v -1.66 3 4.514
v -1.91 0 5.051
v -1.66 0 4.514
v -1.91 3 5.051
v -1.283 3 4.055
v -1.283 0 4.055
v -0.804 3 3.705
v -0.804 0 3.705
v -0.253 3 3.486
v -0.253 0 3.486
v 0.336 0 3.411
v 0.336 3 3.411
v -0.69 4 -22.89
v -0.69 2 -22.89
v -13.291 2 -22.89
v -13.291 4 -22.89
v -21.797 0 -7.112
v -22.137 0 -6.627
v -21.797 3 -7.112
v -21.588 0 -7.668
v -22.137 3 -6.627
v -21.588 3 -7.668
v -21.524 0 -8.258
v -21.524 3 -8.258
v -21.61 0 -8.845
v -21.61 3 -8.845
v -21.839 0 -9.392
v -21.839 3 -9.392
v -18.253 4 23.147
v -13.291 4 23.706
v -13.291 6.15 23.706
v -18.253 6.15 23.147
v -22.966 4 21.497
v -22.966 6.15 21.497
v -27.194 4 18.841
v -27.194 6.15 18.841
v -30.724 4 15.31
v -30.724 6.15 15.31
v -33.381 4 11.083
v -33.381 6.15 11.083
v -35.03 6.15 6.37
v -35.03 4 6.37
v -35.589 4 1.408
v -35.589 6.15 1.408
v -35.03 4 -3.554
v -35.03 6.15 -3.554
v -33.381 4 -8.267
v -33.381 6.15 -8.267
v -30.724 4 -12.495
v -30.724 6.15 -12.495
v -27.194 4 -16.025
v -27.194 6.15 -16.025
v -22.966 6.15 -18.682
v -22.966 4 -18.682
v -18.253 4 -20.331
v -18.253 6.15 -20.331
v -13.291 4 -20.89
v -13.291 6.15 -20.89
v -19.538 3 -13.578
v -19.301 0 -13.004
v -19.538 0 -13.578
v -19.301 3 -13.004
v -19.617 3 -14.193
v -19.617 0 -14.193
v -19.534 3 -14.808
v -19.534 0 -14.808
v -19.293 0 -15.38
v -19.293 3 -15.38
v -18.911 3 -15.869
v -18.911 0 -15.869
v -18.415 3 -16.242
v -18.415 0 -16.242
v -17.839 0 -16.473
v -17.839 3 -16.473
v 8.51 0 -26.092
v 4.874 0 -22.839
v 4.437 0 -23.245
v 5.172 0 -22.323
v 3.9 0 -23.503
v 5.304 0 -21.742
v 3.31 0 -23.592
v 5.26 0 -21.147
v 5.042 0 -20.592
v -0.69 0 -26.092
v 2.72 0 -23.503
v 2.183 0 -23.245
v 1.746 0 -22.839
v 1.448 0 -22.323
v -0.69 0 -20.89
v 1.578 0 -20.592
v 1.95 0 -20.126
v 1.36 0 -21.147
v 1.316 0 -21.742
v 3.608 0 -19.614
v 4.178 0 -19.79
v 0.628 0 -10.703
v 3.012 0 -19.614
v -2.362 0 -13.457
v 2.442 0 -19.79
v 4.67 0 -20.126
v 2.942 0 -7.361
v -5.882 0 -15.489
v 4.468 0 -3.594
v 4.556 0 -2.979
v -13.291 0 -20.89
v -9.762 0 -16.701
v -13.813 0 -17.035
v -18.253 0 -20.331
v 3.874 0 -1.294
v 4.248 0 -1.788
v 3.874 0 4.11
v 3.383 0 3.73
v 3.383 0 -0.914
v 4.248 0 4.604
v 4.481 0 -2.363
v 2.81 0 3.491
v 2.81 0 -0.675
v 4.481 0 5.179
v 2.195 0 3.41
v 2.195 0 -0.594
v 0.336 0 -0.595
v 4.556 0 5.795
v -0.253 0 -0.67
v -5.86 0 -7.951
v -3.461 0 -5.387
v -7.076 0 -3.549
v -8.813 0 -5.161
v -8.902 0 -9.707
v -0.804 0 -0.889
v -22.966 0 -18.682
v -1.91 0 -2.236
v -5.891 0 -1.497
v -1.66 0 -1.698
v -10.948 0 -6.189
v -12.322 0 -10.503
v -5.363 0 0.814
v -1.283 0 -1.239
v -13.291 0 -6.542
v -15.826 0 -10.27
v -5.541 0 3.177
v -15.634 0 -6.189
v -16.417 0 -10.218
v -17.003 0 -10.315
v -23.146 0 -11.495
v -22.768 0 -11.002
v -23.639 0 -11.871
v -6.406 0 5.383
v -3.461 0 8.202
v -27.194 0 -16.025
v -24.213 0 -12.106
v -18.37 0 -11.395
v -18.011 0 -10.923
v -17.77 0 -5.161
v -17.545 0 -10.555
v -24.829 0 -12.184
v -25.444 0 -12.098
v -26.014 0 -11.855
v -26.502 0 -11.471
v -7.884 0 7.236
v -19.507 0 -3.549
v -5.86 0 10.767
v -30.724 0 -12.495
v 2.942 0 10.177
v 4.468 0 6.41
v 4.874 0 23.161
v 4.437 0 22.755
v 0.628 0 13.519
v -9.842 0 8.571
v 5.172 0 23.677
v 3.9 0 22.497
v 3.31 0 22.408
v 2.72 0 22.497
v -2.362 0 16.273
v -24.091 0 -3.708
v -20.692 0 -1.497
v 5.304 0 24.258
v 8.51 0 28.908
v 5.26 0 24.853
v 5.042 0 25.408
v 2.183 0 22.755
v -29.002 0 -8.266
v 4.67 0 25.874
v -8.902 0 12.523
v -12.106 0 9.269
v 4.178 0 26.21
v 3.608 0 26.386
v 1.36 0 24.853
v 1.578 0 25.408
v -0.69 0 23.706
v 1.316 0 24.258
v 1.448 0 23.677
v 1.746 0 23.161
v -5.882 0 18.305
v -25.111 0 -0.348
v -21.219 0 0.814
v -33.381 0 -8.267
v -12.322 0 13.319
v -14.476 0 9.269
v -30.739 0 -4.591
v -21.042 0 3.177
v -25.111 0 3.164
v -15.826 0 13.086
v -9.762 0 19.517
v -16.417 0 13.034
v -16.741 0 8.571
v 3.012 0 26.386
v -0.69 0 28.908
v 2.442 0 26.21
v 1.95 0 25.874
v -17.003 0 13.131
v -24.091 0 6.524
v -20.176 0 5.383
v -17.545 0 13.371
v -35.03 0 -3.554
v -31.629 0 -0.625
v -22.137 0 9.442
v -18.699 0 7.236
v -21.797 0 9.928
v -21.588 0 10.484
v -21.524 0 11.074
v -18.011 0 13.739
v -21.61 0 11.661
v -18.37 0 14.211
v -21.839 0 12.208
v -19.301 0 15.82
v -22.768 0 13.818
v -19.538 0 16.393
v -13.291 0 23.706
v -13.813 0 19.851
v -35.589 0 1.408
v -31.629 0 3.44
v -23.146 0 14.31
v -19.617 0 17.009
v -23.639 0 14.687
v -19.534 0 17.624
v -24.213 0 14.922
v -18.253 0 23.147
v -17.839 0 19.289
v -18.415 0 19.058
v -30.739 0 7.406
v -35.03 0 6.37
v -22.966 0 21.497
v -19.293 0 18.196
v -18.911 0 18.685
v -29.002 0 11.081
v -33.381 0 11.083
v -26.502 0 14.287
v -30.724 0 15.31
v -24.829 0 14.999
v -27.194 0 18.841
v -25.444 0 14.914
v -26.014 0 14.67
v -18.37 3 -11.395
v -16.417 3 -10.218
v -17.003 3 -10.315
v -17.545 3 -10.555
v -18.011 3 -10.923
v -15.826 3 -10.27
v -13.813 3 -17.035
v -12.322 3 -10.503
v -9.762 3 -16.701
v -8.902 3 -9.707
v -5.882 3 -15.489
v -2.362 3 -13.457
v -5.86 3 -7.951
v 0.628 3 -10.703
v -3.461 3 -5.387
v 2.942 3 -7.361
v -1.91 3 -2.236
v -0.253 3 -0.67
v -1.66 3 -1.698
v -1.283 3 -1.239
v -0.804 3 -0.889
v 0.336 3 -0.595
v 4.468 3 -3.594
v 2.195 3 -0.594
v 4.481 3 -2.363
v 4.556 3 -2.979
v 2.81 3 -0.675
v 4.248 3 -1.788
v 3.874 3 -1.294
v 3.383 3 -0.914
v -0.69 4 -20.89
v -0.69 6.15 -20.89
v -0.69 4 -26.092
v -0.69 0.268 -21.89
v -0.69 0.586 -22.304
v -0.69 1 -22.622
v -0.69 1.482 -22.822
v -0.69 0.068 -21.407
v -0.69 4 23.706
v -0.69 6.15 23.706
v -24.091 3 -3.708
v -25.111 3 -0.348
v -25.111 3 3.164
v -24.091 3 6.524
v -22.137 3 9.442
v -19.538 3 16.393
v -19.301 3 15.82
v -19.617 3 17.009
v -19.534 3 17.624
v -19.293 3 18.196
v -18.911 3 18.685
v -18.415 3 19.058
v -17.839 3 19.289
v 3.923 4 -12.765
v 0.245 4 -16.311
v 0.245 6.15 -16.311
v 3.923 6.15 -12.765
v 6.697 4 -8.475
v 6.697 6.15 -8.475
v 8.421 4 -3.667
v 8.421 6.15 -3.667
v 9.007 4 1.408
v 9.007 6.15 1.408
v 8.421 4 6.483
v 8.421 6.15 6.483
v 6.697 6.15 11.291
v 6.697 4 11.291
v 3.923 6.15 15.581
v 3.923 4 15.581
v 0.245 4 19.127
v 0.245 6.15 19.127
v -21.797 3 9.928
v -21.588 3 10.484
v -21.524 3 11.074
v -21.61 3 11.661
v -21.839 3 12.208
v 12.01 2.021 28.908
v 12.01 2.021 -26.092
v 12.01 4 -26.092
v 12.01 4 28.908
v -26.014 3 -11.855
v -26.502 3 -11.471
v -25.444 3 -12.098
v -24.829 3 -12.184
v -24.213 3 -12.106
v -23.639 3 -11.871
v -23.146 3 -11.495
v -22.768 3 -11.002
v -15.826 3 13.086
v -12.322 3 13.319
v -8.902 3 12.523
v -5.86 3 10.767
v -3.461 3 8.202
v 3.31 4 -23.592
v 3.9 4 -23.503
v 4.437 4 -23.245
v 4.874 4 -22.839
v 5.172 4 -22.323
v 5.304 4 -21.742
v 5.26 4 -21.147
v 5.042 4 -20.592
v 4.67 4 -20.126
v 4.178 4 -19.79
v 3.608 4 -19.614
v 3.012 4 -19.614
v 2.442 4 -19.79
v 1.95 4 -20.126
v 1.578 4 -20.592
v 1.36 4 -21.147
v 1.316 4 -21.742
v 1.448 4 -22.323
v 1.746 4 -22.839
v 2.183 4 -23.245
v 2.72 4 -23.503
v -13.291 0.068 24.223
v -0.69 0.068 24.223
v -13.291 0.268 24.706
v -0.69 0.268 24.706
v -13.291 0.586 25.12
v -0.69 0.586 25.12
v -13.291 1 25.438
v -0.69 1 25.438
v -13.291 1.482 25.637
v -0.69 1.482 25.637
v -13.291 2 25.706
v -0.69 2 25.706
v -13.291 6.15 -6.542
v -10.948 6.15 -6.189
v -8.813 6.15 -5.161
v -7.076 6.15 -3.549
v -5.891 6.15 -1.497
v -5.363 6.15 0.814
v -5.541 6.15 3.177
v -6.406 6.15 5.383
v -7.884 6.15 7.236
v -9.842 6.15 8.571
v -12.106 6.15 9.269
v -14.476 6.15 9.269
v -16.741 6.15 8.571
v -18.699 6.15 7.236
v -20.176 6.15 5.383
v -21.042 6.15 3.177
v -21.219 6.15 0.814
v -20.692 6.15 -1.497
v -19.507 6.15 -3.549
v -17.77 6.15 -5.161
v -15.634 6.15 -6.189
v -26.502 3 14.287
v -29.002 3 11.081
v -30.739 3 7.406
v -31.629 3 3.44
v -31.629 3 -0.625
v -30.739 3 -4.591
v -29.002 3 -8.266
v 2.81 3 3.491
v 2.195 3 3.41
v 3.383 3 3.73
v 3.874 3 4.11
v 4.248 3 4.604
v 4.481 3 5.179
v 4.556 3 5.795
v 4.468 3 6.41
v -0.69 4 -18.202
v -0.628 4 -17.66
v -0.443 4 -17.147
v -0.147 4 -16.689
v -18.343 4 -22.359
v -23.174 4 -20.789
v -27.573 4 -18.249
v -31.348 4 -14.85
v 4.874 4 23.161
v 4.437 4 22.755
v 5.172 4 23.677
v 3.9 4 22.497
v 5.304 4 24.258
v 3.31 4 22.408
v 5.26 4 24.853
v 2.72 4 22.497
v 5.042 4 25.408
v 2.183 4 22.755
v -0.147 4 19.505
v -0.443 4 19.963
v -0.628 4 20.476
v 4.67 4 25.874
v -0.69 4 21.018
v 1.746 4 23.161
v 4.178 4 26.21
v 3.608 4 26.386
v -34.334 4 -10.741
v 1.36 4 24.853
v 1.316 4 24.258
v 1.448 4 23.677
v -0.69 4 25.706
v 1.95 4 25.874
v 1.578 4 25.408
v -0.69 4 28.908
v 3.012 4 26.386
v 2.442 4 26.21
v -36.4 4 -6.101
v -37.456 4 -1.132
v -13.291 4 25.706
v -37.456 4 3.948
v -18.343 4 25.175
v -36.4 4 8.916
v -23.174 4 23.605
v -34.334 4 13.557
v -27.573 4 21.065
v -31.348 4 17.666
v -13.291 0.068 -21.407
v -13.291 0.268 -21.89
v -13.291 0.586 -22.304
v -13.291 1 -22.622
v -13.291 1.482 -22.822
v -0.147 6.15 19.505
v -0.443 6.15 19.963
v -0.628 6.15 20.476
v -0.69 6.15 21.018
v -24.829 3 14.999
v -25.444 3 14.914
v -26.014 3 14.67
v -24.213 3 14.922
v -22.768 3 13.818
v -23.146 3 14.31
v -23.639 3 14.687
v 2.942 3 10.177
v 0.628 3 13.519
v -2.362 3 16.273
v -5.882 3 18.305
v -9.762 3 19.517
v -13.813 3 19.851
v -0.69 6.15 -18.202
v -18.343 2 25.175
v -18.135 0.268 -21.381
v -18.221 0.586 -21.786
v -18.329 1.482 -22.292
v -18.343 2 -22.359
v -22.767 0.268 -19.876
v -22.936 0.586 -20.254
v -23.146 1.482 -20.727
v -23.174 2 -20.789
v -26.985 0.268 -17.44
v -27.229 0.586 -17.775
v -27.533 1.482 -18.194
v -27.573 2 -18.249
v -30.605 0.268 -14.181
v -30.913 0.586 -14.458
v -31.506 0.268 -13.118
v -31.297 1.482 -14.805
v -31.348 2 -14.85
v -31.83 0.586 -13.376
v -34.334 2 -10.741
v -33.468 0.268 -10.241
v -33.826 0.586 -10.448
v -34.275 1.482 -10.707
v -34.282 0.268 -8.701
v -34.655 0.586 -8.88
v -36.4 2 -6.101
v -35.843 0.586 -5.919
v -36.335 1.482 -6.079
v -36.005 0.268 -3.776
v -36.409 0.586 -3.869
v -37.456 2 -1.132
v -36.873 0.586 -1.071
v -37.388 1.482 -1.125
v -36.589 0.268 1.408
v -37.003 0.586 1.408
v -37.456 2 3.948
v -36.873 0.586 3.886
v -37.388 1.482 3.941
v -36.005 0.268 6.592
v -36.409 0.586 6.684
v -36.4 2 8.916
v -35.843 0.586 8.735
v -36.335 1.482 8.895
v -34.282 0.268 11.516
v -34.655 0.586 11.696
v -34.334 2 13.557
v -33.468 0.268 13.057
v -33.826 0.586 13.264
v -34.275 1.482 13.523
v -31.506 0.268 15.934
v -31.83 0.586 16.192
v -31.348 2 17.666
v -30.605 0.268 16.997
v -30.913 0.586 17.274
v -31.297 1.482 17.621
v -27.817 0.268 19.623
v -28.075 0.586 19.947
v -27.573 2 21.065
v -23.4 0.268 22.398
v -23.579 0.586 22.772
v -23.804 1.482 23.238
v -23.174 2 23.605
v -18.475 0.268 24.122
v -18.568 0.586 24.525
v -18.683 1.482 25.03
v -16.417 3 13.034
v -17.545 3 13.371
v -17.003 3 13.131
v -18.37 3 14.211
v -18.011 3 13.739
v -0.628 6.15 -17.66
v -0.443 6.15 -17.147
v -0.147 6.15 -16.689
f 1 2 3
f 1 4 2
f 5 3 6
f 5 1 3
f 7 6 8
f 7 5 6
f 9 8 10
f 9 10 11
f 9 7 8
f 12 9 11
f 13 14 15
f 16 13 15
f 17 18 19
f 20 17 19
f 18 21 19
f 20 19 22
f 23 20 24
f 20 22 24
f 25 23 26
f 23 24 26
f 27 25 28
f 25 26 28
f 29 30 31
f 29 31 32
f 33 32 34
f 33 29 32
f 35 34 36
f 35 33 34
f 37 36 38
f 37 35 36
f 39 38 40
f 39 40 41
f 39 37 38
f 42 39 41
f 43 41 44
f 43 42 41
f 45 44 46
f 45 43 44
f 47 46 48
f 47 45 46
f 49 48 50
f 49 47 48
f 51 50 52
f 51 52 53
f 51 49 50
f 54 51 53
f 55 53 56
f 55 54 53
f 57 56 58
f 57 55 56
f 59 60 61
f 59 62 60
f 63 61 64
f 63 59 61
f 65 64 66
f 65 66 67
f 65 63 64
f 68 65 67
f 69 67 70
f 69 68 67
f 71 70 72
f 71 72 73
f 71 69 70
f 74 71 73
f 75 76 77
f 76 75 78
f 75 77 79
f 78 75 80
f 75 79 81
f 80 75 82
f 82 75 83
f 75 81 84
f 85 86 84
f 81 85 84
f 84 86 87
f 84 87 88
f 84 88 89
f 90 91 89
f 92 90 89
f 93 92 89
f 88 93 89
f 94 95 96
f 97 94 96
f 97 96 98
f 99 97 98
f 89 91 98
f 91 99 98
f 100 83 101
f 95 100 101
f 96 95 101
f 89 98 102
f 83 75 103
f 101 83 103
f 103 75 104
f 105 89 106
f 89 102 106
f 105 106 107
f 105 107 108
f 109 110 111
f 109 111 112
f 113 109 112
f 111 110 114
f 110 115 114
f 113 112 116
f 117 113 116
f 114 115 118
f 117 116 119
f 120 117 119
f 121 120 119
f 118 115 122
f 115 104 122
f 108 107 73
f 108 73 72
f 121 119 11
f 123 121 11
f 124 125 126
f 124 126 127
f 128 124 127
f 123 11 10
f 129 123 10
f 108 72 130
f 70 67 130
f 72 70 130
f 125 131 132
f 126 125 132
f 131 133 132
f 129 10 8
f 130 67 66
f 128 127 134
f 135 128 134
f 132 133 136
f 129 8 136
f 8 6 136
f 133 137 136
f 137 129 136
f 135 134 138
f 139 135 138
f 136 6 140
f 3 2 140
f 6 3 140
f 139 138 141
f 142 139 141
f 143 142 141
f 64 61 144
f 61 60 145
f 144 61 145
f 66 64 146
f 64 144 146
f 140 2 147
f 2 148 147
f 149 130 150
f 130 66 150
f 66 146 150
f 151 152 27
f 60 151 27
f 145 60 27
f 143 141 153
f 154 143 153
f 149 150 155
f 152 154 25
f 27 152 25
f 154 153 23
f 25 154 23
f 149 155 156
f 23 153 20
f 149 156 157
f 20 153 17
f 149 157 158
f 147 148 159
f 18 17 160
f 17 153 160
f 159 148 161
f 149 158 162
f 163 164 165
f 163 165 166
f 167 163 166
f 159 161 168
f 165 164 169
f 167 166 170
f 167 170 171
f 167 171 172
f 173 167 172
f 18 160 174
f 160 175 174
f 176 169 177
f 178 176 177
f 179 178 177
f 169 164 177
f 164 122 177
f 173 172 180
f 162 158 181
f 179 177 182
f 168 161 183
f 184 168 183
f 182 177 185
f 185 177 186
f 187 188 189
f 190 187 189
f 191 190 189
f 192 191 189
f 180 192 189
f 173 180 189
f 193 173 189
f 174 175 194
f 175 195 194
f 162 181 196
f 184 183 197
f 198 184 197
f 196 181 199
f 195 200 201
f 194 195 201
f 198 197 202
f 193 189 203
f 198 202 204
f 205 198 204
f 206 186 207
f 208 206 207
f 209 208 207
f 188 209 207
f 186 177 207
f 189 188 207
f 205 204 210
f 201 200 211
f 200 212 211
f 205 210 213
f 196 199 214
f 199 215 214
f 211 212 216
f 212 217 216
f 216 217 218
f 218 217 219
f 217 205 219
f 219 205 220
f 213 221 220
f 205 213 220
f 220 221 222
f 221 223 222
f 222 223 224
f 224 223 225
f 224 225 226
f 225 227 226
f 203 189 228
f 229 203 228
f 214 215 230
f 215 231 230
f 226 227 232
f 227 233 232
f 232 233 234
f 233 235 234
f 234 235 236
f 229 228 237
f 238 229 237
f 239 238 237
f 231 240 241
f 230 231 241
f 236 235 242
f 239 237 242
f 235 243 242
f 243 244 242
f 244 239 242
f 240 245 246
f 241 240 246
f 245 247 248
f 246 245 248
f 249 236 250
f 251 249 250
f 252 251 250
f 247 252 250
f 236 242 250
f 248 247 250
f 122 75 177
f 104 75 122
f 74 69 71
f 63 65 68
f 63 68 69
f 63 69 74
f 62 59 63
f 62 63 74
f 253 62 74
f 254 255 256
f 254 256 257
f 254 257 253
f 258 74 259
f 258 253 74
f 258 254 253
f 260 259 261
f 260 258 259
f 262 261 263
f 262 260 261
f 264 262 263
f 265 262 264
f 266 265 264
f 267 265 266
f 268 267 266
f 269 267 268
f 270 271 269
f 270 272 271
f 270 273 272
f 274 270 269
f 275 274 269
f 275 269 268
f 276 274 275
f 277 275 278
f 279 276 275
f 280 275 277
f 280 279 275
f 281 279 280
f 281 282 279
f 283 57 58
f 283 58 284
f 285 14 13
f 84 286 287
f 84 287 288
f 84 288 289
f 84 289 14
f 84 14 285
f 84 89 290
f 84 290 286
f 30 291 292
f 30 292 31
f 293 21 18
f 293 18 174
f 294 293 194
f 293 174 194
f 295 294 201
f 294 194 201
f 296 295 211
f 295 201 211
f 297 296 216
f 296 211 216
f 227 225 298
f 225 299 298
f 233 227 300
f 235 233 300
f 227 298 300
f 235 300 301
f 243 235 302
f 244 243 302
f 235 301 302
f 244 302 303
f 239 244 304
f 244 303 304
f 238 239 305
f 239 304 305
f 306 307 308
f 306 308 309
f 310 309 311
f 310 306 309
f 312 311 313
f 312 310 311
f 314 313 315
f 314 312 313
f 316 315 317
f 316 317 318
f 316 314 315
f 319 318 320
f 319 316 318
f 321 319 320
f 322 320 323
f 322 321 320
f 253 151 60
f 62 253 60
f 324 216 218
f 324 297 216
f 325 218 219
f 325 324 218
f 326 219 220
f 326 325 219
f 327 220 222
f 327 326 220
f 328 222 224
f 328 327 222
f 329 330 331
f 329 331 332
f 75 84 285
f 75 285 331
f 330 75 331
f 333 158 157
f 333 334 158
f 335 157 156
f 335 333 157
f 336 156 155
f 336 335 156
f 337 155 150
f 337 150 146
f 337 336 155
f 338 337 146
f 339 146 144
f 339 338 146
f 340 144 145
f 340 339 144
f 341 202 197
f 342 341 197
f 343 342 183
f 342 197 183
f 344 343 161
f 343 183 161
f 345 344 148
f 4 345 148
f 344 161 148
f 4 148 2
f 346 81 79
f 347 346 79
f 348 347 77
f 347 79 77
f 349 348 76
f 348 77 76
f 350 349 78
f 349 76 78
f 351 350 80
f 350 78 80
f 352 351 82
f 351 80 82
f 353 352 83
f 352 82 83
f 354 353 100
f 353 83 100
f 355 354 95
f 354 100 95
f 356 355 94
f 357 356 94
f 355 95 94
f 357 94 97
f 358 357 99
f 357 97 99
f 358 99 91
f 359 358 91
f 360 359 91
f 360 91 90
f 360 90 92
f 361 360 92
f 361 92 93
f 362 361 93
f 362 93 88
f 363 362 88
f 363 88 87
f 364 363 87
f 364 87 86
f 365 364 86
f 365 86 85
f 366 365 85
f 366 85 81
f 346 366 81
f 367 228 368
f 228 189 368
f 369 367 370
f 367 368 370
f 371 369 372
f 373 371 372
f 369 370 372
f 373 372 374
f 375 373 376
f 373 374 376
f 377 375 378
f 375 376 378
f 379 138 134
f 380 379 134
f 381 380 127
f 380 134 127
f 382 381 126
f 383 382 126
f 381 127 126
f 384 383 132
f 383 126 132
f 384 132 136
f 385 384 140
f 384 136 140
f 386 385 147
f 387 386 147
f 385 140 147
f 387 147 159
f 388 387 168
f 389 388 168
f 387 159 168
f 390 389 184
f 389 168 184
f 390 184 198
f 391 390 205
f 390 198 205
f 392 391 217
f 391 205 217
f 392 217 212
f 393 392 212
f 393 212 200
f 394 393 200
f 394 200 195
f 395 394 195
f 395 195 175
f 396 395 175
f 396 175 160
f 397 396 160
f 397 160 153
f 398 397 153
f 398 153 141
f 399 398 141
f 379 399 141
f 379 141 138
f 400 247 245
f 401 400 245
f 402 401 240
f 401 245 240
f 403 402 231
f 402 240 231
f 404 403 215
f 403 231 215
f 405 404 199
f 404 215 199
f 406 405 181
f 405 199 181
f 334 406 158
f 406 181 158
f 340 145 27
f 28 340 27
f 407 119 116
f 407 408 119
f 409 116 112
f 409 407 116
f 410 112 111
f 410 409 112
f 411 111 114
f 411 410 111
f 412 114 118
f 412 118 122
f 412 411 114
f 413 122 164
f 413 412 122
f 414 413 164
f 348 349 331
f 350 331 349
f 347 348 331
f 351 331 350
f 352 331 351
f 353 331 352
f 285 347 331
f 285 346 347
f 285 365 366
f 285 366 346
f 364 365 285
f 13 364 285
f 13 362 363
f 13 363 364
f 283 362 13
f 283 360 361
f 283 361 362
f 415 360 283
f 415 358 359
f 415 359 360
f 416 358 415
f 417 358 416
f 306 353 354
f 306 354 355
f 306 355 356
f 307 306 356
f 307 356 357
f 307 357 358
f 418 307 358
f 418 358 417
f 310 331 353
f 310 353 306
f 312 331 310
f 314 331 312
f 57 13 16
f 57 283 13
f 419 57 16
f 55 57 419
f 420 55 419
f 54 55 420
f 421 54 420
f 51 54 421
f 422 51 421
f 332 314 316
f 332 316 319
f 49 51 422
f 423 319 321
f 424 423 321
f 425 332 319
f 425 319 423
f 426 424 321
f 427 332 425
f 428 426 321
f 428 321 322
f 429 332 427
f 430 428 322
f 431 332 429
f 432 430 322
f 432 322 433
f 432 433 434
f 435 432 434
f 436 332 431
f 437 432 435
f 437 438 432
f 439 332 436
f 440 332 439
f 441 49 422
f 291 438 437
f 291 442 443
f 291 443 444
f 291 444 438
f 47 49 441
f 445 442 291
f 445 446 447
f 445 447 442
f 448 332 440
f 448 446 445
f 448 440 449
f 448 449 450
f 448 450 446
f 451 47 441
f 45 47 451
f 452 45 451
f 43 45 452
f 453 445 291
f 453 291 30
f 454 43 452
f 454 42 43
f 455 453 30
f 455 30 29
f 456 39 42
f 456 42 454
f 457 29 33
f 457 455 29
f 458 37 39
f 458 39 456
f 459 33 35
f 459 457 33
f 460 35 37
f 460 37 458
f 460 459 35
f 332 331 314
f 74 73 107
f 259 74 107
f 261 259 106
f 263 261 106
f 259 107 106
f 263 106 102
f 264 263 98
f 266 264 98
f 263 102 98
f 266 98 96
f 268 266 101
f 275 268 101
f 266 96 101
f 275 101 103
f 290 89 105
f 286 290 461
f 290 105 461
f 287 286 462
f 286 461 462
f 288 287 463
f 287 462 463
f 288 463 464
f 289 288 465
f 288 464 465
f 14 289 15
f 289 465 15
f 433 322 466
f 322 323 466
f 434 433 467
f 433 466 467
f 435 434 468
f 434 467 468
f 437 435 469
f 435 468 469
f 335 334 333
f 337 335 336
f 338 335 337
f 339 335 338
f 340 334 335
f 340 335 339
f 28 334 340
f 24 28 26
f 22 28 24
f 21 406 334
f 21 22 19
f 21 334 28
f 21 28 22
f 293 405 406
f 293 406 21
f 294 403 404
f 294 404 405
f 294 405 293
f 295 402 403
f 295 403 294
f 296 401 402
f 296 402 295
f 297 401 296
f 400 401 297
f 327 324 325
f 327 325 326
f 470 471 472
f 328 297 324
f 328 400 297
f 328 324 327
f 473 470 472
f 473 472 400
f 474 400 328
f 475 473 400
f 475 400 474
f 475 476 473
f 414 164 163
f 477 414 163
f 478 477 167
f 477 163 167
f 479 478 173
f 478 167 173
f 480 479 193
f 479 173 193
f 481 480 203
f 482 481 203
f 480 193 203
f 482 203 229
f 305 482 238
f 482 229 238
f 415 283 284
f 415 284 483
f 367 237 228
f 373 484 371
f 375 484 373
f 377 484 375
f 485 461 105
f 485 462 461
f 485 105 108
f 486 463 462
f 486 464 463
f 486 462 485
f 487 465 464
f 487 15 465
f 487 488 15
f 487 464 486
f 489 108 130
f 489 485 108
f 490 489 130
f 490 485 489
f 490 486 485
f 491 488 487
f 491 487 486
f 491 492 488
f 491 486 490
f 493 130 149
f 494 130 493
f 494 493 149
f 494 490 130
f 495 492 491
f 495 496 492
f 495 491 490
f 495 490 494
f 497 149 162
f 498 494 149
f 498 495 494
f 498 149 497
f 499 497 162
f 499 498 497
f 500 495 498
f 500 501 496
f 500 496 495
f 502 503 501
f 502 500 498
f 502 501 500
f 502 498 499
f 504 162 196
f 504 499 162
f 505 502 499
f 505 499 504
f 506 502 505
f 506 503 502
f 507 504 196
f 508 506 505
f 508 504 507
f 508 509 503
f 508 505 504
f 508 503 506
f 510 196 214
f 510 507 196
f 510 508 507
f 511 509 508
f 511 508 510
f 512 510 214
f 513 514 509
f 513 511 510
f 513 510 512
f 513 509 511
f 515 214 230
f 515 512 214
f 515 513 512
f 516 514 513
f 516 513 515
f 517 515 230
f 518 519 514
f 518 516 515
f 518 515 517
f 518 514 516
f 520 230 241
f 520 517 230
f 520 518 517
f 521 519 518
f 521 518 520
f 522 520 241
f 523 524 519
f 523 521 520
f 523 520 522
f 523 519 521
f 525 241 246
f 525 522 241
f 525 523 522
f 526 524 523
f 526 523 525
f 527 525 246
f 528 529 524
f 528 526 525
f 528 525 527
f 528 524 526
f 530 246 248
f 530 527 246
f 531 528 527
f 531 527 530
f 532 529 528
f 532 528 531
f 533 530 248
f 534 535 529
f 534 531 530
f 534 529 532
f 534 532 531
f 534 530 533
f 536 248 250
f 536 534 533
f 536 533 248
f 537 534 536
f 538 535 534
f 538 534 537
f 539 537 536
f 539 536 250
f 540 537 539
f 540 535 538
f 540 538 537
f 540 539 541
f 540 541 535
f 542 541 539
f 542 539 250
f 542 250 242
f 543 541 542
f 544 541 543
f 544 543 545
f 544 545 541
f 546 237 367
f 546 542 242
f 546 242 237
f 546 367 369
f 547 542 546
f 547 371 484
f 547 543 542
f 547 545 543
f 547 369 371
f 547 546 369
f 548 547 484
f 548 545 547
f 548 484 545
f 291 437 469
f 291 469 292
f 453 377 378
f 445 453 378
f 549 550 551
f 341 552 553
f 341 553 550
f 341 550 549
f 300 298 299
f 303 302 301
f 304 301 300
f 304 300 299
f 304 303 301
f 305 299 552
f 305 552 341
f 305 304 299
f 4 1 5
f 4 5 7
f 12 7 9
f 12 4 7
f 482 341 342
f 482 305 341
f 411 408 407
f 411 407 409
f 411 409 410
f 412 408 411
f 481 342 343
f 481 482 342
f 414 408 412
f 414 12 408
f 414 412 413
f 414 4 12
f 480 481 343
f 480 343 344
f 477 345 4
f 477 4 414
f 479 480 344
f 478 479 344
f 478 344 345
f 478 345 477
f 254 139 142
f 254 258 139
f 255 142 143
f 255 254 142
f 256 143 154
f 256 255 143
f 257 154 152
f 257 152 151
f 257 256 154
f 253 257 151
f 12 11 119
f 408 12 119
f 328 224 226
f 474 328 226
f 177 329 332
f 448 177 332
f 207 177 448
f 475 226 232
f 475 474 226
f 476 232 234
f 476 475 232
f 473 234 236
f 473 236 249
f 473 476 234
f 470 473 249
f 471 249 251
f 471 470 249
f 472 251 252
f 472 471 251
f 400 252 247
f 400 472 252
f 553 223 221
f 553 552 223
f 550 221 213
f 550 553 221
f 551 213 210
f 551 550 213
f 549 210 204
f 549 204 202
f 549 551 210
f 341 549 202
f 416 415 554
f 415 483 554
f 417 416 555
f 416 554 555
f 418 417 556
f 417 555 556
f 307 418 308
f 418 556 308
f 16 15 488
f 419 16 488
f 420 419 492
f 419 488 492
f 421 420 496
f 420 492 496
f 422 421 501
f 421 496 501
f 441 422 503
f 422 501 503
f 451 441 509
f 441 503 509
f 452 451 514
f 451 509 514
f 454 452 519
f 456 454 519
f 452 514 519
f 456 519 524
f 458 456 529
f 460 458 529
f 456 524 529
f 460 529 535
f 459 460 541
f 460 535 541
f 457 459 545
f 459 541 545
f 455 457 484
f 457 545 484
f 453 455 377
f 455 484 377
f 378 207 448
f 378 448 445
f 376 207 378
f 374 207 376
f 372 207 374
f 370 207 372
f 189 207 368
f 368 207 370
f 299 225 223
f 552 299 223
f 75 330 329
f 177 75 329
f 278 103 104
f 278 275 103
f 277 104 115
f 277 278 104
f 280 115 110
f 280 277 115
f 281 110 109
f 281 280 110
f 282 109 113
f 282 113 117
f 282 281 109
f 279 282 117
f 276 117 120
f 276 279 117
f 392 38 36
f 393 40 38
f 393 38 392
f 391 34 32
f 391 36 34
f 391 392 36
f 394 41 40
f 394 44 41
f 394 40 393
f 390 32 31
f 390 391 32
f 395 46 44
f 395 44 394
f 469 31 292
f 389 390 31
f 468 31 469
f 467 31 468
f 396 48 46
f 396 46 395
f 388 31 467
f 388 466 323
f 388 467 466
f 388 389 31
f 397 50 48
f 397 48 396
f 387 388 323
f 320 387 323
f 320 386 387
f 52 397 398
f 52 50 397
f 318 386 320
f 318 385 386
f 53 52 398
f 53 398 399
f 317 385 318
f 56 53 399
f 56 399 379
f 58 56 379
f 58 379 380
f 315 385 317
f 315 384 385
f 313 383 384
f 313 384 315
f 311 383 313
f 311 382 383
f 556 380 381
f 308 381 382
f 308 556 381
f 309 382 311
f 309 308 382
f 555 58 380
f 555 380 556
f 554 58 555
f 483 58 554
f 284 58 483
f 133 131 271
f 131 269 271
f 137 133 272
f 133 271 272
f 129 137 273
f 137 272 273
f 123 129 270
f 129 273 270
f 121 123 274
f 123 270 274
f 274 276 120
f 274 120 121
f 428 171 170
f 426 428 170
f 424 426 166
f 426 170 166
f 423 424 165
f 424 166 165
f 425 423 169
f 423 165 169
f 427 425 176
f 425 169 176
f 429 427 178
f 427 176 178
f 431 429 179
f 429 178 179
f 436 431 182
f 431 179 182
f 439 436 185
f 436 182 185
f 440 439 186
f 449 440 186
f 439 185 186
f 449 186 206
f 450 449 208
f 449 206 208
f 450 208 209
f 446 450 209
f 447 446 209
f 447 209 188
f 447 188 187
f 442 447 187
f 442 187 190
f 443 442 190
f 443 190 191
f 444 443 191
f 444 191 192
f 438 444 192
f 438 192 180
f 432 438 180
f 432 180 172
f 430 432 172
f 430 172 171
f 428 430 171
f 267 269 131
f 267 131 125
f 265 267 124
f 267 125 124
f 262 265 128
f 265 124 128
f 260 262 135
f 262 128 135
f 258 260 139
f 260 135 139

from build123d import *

# Parameters (mm, degrees)
BOSS_EXTRUDE1_DEPTH = 4
BOSS_EXTRUDE2_DEPTH = 2.25
SKETCH3_R           = 7.95
CUT_EXTRUDE1_DEPTH  = 9.25
SKETCH4_R           = 2
CUT_EXTRUDE2_DEPTH  = 9.25
CUT_EXTRUDE3_DEPTH  = 3
FILLET1_R           = 2.36
CHAMFER1_SIZE       = 3.5
CHAMFER1_SIZE2      = 2.020725942
BOSS_EXTRUDE3_DEPTH = 4
FILLET2_R           = 2
SKETCH7_W           = 56.562445917
SKETCH7_H           = 51.963873078
CUT_EXTRUDE4_DEPTH  = 0.1
FILLET3_R           = 2.38


with BuildPart() as part:
    # Sketch1 → Boss-Extrude1 (new body)
    with BuildSketch(Plane(origin=(0, 0, 0), x_dir=(1, 0, 0), z_dir=(0, 1, 0))):
        with BuildLine():
            Line((-13.29118379, 20.889836125), (-0.68999579, 20.889836125))
            Line((-0.68999579, 20.889836125), (-0.68999579, 24.09210312))
            Line((-0.68999579, 24.09210312), (-0.68999579, 26.09210312))
            Line((-0.68999579, 26.09210312), (12.01000421, 26.09210312))
            Line((12.01000421, 26.09210312), (12.01000421, 24.09210312))
            Line((12.01000421, 24.09210312), (12.01000421, -26.90789688))
            Line((12.01000421, -26.90789688), (12.01000421, -28.90789688))
            Line((12.01000421, -28.90789688), (-0.68999579, -28.90789688))
            Line((-0.68999579, -28.90789688), (-0.68999579, -26.90789688))
            Line((-0.68999579, -26.90789688), (-0.68999579, -23.705629885))
            Line((-0.68999579, -23.705629885), (-13.29118379, -23.705629885))
            ThreePointArc((-13.29118379, -23.705629885), (-35.588916795, -1.40789688), (-13.29118379, 20.889836125))
        make_face()
    extrude(amount=BOSS_EXTRUDE1_DEPTH)

    # Sketch2 → Boss-Extrude2 (add)
    with BuildSketch(Plane(origin=(0, 4, 0), x_dir=(1, 0, 0), z_dir=(0, 1, 0))):
        with BuildLine():
            Line((-0.68999579, 20.889836125), (-0.68999579, 16.987726462))
            ThreePointArc((-0.68999579, 16.987726462), (9.006549215, -1.40789688), (-0.68999579, -19.803520222))
            Line((-0.68999579, -19.803520222), (-0.68999579, -23.705629885))
            Line((-0.68999579, -23.705629885), (-13.29118379, -23.705629885))
            ThreePointArc((-13.29118379, -23.705629885), (-35.588916795, -1.40789688), (-13.29118379, 20.889836125))
            Line((-13.29118379, 20.889836125), (-0.68999579, 20.889836125))
        make_face()
    extrude(amount=BOSS_EXTRUDE2_DEPTH)

    # Sketch3 → Cut-Extrude1 (cut)
    with BuildSketch(Plane.XZ):
        with Locations((-13.29118379, 1.40789688)):
            Circle(SKETCH3_R)
    extrude(amount=-CUT_EXTRUDE1_DEPTH, mode=Mode.SUBTRACT)

    # Sketch4 → Cut-Extrude2 (cut)
    with BuildSketch(Plane.XZ):
        with Locations((3.31000421, -21.59210312)):
            Circle(SKETCH4_R)
        with Locations((3.31000421, 24.40789688)):
            Circle(SKETCH4_R)
    extrude(amount=-CUT_EXTRUDE2_DEPTH, mode=Mode.SUBTRACT)

    # Sketch5 → Cut-Extrude3 (cut)
    with BuildSketch(Plane.XZ):
        with BuildLine():
            ThreePointArc((-20.917233099, -7.792422241), (-25.24118379, 1.40789688), (-20.917233099, 10.608216001))
            Line((-20.917233099, 10.608216001), (-24.193916765, 16.291878661))
            ThreePointArc((-24.193916765, 16.291878661), (-31.74118379, 1.40789688), (-24.193916765, -13.476084902))
            Line((-24.193916765, -13.476084902), (-20.917233099, -7.792422241))
        make_face()
        with BuildLine():
            Line((-20.729723635, 18.291931497), (-17.445869217, 12.612408873))
            ThreePointArc((-17.445869217, 12.612408873), (-7.31618379, 11.756900455), (-1.510449053, 3.412089752))
            Line((-1.510449053, 3.412089752), (5.05008903, 3.407949716))
            ThreePointArc((5.05008903, 3.407949716), (-4.06618379, 17.38606558), (-20.729723635, 18.291931497))
        make_face()
        with BuildLine():
            ThreePointArc((-1.510449053, -0.596295992), (-7.31618379, -8.941106696), (-17.445869217, -9.796615113))
            Line((-17.445869217, -9.796615113), (-20.729723635, -15.476137738))
            ThreePointArc((-20.729723635, -15.476137738), (-4.06618379, -14.57027182), (5.05008903, -0.592155956))
            Line((5.05008903, -0.592155956), (-1.510449053, -0.596295992))
        make_face()
    extrude(amount=-CUT_EXTRUDE3_DEPTH, mode=Mode.SUBTRACT)

    # Fillet1
    fillet1_edges = [part.edges().sort_by_distance(p)[0] for p in [
        (5.05008903, 1.5, 3.407949716),
        (-1.510449053, 1.5, 3.412089752),
        (5.05008903, 1.5, -0.592155956),
        (-24.193916765, 1.5, 16.291878661),
        (-20.729723635, 1.5, 18.291931497),
        (-1.510449053, 1.5, -0.596295992),
        (-20.729723635, 1.5, -15.476137738),
        (-20.917233099, 1.5, 10.608216001),
        (-20.917233099, 1.5, -7.792422241),
        (-24.193916765, 1.5, -13.476084902),
        (-17.445869217, 1.5, -9.796615113),
        (-17.445869217, 1.5, 12.612408873),
    ]]
    fillet(fillet1_edges, radius=FILLET1_R)

    # Chamfer1
    chamfer1_edges = [part.edges().sort_by_distance(p)[0] for p in [
        (12.01000421, 0, 1.40789688),
    ]]
    chamfer1_side = [part.faces().sort_by_distance(p)[0] for p in [
        (-3.702499267, 0, 18.015985651),
    ]]
    chamfer(chamfer1_edges, length=CHAMFER1_SIZE, length2=CHAMFER1_SIZE2, reference=chamfer1_side[0])

    # Sketch6 → Boss-Extrude3 (add)
    with BuildSketch(Plane.XZ):
        with BuildLine():
            Line((-0.68999579, -22.889836125), (-13.29118379, -22.889836125))
            ThreePointArc((-13.29118379, -22.889836125), (-37.588916795, 1.40789688), (-13.29118379, 25.705629885))
            Line((-13.29118379, 25.705629885), (-0.68999579, 25.705629885))
            Line((-0.68999579, 25.705629885), (-0.68999579, 23.705629885))
            Line((-0.68999579, 23.705629885), (-13.29118379, 23.705629885))
            ThreePointArc((-13.29118379, 23.705629885), (-35.588916795, 1.40789688), (-13.29118379, -20.889836125))
            Line((-13.29118379, -20.889836125), (-0.68999579, -20.889836125))
            Line((-0.68999579, -20.889836125), (-0.68999579, -22.889836125))
        make_face()
    extrude(amount=-BOSS_EXTRUDE3_DEPTH)

    # Fillet2
    fillet2_edges = [part.edges().sort_by_distance(p)[0] for p in [
        (-6.99058979, 0, 25.705629885),
        (-6.99058979, 0, -22.889836125),
        (-37.588916795, 0, 1.40789688),
    ]]
    fillet(fillet2_edges, radius=FILLET2_R)

    # Sketch7 → Cut-Extrude4 (cut)
    with BuildSketch(Plane(origin=(0, 6.25, 0), x_dir=(1, 0, 0), z_dir=(0, 1, 0))):
        with Locations((-12.789456293, -2.500057929)):
            Rectangle(SKETCH7_W, SKETCH7_H)
    extrude(amount=-CUT_EXTRUDE4_DEPTH, mode=Mode.SUBTRACT)

    # Fillet3
    fillet3_edges = [part.edges().sort_by_distance(p)[0] for p in [
        (-0.68999579, 5.075, -16.987726462),
        (-0.68999579, 5.075, 19.803520222),
    ]]
    fillet(fillet3_edges, radius=FILLET3_R)


solid = part.part
